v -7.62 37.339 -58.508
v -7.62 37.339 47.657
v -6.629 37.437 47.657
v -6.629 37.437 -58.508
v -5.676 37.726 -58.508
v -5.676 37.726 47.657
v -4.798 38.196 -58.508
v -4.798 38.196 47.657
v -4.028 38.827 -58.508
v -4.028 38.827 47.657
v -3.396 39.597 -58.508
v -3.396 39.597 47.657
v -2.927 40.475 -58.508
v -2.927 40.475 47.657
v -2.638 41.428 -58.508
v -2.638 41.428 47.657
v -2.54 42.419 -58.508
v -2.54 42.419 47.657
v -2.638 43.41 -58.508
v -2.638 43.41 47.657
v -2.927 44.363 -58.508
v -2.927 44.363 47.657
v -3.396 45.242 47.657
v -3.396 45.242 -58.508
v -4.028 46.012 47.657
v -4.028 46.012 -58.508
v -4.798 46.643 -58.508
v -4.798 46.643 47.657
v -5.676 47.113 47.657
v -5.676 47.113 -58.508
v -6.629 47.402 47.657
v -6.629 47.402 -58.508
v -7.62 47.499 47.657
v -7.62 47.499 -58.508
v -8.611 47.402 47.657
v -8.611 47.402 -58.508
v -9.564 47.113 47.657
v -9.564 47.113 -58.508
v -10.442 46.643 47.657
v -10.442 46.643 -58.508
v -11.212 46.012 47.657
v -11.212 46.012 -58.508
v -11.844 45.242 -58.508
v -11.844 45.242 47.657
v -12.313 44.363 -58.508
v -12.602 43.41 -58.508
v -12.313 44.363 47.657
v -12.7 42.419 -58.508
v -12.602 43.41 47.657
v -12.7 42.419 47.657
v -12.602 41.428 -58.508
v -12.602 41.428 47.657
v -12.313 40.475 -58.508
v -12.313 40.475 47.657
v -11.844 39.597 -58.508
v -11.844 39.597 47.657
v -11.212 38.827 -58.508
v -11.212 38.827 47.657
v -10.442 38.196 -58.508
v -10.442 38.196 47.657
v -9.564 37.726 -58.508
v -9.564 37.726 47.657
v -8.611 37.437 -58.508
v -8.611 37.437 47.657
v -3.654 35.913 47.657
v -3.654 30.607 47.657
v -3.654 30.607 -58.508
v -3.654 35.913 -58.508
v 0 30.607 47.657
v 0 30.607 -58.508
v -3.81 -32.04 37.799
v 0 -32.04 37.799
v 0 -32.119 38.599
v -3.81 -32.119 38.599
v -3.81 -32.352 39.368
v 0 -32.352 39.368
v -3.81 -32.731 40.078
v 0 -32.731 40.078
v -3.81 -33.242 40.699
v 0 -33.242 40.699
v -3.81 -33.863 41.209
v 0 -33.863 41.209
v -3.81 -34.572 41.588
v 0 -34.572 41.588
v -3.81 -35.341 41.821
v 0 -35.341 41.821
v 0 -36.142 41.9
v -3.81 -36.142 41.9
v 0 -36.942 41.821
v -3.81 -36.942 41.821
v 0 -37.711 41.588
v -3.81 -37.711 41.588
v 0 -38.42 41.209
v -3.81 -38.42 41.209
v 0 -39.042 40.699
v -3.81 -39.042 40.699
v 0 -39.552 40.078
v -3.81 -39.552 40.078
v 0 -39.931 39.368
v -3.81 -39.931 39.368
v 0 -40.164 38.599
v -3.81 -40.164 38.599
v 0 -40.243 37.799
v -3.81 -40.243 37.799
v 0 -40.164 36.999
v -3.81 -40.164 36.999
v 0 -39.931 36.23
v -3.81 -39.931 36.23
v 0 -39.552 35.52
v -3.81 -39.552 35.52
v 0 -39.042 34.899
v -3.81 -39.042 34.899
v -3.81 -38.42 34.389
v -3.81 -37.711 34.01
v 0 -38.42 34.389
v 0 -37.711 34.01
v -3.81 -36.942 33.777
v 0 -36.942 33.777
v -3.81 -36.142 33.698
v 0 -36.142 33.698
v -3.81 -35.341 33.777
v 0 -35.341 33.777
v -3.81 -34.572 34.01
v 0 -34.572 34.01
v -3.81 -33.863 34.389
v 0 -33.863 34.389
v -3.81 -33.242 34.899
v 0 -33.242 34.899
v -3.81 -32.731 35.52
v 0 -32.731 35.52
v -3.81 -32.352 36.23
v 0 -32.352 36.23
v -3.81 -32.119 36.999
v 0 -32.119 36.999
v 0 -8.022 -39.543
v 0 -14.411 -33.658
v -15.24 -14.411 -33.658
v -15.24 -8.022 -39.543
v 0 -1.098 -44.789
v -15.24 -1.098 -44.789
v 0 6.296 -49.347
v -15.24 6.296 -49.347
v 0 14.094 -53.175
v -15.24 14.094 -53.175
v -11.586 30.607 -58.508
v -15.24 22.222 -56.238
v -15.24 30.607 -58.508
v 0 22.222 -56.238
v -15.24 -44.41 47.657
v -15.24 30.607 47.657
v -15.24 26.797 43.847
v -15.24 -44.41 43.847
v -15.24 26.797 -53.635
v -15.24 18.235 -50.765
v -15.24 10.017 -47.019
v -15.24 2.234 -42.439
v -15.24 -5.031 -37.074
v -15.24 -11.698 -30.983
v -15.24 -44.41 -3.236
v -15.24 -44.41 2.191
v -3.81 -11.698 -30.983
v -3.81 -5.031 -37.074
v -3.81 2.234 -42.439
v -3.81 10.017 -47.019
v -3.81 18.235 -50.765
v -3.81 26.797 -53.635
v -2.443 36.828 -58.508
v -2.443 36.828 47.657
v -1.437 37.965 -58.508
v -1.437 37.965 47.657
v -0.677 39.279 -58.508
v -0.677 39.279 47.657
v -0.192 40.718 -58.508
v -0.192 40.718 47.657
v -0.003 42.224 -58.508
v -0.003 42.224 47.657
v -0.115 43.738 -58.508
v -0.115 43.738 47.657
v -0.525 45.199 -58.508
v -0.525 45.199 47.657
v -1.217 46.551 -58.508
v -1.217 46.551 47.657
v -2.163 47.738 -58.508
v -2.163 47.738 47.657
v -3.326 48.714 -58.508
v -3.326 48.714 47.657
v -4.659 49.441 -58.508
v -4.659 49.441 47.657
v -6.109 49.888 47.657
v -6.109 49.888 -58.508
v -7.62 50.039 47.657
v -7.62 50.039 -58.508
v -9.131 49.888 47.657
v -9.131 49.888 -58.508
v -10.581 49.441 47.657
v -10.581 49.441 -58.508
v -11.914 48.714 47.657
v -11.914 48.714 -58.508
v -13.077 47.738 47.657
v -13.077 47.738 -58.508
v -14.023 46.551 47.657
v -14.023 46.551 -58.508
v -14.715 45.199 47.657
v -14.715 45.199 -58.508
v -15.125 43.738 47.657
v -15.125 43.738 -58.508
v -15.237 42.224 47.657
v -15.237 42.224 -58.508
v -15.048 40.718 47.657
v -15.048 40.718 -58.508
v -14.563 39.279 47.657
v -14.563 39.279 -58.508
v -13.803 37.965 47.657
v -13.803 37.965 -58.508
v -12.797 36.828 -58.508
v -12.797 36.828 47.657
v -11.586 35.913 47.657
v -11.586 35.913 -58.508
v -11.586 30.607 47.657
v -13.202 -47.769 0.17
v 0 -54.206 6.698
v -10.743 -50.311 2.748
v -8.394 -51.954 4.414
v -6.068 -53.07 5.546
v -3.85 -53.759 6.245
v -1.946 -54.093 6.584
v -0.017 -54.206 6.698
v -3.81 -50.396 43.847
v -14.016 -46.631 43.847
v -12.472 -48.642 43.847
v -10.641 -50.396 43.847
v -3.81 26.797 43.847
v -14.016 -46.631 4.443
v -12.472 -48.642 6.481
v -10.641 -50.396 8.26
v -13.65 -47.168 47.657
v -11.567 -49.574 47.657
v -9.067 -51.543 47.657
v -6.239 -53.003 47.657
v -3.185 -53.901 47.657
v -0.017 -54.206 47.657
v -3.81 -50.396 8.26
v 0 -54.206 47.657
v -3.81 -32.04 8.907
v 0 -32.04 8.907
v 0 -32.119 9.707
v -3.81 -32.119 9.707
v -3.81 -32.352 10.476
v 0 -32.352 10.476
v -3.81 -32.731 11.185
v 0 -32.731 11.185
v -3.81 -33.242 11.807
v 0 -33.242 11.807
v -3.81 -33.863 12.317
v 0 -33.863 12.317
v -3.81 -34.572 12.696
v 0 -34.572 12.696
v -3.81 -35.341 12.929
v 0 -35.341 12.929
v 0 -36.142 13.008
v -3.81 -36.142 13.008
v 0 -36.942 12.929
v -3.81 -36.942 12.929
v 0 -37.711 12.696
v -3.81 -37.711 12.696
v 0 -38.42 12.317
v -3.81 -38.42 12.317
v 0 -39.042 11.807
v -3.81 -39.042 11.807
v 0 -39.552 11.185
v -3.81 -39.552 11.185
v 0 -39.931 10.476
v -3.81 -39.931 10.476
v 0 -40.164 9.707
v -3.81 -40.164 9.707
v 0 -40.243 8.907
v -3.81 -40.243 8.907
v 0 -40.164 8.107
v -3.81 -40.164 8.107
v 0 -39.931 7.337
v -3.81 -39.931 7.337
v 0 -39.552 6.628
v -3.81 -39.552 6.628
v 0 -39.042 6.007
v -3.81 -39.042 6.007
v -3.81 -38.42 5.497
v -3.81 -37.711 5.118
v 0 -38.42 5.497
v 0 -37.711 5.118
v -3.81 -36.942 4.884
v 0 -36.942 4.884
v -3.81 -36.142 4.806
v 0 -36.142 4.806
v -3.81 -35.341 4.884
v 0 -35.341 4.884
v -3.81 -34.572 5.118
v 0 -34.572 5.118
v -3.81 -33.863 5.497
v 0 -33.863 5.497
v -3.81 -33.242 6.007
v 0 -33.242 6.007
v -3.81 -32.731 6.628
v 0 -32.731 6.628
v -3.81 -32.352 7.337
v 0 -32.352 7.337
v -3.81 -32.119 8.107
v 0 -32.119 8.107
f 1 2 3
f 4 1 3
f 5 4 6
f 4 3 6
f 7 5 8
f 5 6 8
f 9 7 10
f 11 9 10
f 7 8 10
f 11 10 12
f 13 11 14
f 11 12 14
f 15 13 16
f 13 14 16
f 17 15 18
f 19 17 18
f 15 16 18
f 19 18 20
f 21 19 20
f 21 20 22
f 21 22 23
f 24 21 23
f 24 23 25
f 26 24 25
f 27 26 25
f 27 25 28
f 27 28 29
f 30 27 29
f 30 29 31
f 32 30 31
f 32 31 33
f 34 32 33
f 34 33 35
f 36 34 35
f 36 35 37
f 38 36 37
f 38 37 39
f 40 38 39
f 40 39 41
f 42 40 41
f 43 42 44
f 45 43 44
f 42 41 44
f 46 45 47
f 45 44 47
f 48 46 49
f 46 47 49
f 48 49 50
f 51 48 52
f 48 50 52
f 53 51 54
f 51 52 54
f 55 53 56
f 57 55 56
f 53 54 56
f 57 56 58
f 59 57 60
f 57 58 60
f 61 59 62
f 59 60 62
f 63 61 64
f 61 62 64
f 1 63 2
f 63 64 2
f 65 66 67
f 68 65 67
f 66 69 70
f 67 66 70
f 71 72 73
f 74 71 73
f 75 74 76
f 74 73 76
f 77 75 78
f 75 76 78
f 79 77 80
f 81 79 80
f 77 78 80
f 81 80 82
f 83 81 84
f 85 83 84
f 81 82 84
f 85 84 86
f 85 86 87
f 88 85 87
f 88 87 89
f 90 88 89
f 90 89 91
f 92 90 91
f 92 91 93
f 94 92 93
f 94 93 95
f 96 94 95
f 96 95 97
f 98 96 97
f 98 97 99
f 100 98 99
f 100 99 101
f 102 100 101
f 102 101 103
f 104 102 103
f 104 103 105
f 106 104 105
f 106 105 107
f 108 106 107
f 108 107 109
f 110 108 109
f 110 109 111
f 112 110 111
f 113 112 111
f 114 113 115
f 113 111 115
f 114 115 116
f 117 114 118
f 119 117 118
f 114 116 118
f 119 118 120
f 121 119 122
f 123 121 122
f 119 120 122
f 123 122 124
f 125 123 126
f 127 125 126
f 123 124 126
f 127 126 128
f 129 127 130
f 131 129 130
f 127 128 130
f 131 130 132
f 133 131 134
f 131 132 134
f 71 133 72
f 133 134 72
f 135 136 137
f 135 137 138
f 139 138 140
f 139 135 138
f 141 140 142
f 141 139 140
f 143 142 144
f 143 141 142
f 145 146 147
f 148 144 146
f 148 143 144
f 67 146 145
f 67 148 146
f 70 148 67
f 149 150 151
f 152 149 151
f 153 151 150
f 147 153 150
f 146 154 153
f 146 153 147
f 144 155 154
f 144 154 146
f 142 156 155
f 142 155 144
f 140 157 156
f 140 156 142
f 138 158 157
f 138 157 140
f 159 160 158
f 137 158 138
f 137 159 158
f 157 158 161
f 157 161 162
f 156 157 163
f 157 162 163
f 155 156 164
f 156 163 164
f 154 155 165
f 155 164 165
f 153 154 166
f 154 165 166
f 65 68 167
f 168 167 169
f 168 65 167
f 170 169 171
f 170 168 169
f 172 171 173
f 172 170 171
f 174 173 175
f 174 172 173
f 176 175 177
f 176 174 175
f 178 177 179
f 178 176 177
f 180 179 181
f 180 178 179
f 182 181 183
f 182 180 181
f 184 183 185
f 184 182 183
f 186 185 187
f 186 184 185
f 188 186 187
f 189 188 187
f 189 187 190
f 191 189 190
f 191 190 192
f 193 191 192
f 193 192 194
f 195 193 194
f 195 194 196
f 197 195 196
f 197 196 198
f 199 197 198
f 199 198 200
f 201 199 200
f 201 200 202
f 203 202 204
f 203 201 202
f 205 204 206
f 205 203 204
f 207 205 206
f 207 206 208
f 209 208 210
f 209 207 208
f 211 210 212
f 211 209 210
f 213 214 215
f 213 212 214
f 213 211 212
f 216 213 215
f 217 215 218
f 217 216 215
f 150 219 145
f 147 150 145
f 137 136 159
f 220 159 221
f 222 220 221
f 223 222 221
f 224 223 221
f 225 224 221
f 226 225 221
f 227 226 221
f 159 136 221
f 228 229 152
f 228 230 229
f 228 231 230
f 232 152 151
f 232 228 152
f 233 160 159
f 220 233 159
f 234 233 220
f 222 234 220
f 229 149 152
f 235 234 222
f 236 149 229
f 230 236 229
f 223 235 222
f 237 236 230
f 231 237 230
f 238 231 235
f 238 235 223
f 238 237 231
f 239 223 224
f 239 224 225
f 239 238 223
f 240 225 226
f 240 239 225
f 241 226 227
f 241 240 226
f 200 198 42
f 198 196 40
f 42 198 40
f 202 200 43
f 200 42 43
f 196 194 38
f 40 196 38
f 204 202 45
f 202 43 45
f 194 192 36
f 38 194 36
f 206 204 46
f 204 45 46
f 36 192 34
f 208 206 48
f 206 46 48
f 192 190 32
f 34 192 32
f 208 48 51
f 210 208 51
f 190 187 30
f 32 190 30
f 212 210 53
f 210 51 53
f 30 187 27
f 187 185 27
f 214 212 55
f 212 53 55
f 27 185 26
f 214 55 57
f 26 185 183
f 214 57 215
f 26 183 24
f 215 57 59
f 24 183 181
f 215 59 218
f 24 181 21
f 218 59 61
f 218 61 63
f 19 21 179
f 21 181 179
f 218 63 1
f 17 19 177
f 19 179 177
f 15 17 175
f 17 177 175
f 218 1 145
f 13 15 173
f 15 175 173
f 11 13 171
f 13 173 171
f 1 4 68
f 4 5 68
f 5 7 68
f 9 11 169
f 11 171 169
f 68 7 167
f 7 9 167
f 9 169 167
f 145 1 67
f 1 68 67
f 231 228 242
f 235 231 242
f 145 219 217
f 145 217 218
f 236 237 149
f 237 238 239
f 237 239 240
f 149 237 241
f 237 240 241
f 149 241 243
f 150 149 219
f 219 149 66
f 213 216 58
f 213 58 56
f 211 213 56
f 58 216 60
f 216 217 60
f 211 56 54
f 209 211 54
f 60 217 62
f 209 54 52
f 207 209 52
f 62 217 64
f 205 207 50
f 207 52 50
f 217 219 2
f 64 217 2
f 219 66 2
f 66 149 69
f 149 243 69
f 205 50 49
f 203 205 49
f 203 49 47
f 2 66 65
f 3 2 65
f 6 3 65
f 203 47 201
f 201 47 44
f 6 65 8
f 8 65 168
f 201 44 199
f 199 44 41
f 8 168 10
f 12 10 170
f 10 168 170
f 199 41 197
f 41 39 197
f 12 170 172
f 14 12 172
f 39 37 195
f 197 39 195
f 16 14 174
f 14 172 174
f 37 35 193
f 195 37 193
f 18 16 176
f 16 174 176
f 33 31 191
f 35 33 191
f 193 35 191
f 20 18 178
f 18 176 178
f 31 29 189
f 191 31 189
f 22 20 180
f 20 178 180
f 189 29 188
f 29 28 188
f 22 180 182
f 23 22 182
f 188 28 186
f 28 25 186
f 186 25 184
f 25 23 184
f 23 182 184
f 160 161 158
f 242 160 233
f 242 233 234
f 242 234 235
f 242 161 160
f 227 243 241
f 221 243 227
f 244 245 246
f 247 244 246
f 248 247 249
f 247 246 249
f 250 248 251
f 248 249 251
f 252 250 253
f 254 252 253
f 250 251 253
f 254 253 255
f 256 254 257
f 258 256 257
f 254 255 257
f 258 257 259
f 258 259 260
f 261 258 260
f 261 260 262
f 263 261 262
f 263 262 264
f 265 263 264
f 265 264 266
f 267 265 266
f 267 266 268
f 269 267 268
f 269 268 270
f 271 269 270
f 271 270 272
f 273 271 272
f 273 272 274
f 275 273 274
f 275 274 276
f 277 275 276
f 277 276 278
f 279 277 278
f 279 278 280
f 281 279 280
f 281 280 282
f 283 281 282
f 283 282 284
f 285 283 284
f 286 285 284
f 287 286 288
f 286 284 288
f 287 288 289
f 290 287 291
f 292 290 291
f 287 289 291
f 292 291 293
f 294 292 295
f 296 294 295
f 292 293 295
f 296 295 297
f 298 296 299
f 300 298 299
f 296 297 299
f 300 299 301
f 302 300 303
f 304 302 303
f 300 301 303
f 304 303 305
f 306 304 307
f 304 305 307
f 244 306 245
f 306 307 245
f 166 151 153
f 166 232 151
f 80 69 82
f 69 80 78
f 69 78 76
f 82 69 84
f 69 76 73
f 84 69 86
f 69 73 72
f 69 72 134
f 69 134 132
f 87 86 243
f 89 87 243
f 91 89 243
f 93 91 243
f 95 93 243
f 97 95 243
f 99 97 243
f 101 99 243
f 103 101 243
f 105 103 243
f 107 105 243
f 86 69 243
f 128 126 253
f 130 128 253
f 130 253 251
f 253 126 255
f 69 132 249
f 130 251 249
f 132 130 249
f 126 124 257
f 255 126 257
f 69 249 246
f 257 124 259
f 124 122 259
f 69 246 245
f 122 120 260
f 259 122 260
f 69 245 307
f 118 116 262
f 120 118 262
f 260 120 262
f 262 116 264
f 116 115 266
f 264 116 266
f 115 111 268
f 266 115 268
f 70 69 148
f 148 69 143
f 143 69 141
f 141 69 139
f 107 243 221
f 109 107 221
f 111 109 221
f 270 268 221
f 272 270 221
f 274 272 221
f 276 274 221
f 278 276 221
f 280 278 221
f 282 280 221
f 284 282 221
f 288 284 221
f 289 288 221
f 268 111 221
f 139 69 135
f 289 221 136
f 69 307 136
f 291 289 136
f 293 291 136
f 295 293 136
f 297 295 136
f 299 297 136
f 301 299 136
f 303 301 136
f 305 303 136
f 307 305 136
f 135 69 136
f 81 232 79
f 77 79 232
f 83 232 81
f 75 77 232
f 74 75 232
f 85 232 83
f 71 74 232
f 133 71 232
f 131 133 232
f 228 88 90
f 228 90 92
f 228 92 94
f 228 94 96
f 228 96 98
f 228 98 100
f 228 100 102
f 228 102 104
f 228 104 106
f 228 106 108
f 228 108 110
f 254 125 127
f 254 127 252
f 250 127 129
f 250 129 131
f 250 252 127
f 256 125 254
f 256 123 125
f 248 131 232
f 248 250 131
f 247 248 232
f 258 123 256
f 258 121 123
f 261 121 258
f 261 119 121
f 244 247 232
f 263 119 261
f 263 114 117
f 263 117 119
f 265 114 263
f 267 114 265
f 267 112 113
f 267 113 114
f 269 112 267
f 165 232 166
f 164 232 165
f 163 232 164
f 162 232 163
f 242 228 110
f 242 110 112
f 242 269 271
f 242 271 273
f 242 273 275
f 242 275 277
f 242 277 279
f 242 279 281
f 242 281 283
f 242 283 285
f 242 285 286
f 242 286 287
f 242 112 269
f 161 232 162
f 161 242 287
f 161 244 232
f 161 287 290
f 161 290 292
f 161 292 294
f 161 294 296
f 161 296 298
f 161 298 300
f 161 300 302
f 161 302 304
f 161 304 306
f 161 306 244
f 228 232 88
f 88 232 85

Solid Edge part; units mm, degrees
sketch "Sketch1" plane through (0, 0, 0) normal (1, 0, 0) x (0, 1, 0)
  line L0 (-14.4105, -33.6582) -> (-54.2057, 6.6977)
  line L1 (-54.2057, 47.6572) -> (-54.2057, 6.6977)
  line L2 (-54.2057, 47.6572) -> (30.6069, 47.6572)
  line L3 (30.6069, 47.6572) -> (30.6069, -58.5082)
  arc A0 (30.6069, -58.5082) -> (-14.4105, -33.6582) centre (50.0394, 29.8961) cw
extrude "Protrusion1" add sketch "Sketch1" against normal blind 15.24
shell "Thinwall_3" thickness 3.81 removed faces 1 at (-15.24, 15.6233, 31.0246)
sketch "Sketch2" plane through (-7.62, -9.7031, 47.6572) normal (0, 0, 1) x (0, -1, 0)
  circle A0 centre (-52.1225, 0) radius 7.62
extrude "Protrusion2" add sketch "Sketch2" against normal up to vertex (106.1654 mm away)
sketch "Sketch3" plane through (-7.62, -9.7031, 47.6572) normal (0, 0, 1) x (0, -1, 0)
  circle A0 centre (-52.1225, 0) radius 5.08
extrude "ExtrudedCutout_4" cut sketch "Sketch3" against normal blind 129.2134
sketch "Sketch4" plane through (-7.62, 30.6069, -5.4255) normal (0, 1, 0) x (0, 0, -1)
  line L0 (-53.0827, 3.9657) -> (-53.0827, 0)
  line L1 (-53.0827, 0) -> (-53.0827, -3.9657)
  line L2 (-53.0827, -3.9657) -> (55.1975, -3.9657)
  line L3 (55.1975, -3.9657) -> (55.1975, 3.9657)
  line L4 (-53.0827, 3.9657) -> (55.1975, 3.9657)
extrude "ExtrudedProtrusion_14" add sketch "Sketch4" along normal blind 6.1628
sketch "Sketch5" plane through (-7.62, -2.0831, 47.6572) normal (0, 0, 1) x (0, 1, 0)
  line L0 (-52.1225, 7.62) -> (-52.1225, -7.62)
  line L1 (-52.1225, 7.62) -> (-42.3273, 7.62)
  arc A0 (-42.3273, 7.62) -> (-52.1226, -7.62) centre (-35.3826, -7.6115) ccw
extrude "ExtrudedCutout_5" cut sketch "Sketch5" against normal blind 61.7549
sketch "Sketch6" plane through (-3.6543, 33.6883, -6.4829) normal (1, 0, 0) x (0, 0, -1)
  line L0 (52.0253, 3.0814) -> (52.0253, -3.0814)
  line L1 (52.0253, -3.0814) -> (54.1401, -3.0814)
  line L2 (54.1401, -3.0814) -> (54.1401, 3.0814)
  line L3 (54.1401, 3.0814) -> (52.0253, 3.0814)
extrude "Cutout1" cut sketch "Sketch6" against normal blind 271.2891
sketch "Sketch7" plane through (0, -11.7994, -5.4255) normal (1, 0, 0) x (0, 1, 0)
  circle A0 centre (-24.3422, 43.2245) radius 4.1013
  circle A1 centre (-24.3422, 14.3323) radius 4.1013
extrude "Cutout2" cut sketch "Sketch7" against normal blind 48.3927
